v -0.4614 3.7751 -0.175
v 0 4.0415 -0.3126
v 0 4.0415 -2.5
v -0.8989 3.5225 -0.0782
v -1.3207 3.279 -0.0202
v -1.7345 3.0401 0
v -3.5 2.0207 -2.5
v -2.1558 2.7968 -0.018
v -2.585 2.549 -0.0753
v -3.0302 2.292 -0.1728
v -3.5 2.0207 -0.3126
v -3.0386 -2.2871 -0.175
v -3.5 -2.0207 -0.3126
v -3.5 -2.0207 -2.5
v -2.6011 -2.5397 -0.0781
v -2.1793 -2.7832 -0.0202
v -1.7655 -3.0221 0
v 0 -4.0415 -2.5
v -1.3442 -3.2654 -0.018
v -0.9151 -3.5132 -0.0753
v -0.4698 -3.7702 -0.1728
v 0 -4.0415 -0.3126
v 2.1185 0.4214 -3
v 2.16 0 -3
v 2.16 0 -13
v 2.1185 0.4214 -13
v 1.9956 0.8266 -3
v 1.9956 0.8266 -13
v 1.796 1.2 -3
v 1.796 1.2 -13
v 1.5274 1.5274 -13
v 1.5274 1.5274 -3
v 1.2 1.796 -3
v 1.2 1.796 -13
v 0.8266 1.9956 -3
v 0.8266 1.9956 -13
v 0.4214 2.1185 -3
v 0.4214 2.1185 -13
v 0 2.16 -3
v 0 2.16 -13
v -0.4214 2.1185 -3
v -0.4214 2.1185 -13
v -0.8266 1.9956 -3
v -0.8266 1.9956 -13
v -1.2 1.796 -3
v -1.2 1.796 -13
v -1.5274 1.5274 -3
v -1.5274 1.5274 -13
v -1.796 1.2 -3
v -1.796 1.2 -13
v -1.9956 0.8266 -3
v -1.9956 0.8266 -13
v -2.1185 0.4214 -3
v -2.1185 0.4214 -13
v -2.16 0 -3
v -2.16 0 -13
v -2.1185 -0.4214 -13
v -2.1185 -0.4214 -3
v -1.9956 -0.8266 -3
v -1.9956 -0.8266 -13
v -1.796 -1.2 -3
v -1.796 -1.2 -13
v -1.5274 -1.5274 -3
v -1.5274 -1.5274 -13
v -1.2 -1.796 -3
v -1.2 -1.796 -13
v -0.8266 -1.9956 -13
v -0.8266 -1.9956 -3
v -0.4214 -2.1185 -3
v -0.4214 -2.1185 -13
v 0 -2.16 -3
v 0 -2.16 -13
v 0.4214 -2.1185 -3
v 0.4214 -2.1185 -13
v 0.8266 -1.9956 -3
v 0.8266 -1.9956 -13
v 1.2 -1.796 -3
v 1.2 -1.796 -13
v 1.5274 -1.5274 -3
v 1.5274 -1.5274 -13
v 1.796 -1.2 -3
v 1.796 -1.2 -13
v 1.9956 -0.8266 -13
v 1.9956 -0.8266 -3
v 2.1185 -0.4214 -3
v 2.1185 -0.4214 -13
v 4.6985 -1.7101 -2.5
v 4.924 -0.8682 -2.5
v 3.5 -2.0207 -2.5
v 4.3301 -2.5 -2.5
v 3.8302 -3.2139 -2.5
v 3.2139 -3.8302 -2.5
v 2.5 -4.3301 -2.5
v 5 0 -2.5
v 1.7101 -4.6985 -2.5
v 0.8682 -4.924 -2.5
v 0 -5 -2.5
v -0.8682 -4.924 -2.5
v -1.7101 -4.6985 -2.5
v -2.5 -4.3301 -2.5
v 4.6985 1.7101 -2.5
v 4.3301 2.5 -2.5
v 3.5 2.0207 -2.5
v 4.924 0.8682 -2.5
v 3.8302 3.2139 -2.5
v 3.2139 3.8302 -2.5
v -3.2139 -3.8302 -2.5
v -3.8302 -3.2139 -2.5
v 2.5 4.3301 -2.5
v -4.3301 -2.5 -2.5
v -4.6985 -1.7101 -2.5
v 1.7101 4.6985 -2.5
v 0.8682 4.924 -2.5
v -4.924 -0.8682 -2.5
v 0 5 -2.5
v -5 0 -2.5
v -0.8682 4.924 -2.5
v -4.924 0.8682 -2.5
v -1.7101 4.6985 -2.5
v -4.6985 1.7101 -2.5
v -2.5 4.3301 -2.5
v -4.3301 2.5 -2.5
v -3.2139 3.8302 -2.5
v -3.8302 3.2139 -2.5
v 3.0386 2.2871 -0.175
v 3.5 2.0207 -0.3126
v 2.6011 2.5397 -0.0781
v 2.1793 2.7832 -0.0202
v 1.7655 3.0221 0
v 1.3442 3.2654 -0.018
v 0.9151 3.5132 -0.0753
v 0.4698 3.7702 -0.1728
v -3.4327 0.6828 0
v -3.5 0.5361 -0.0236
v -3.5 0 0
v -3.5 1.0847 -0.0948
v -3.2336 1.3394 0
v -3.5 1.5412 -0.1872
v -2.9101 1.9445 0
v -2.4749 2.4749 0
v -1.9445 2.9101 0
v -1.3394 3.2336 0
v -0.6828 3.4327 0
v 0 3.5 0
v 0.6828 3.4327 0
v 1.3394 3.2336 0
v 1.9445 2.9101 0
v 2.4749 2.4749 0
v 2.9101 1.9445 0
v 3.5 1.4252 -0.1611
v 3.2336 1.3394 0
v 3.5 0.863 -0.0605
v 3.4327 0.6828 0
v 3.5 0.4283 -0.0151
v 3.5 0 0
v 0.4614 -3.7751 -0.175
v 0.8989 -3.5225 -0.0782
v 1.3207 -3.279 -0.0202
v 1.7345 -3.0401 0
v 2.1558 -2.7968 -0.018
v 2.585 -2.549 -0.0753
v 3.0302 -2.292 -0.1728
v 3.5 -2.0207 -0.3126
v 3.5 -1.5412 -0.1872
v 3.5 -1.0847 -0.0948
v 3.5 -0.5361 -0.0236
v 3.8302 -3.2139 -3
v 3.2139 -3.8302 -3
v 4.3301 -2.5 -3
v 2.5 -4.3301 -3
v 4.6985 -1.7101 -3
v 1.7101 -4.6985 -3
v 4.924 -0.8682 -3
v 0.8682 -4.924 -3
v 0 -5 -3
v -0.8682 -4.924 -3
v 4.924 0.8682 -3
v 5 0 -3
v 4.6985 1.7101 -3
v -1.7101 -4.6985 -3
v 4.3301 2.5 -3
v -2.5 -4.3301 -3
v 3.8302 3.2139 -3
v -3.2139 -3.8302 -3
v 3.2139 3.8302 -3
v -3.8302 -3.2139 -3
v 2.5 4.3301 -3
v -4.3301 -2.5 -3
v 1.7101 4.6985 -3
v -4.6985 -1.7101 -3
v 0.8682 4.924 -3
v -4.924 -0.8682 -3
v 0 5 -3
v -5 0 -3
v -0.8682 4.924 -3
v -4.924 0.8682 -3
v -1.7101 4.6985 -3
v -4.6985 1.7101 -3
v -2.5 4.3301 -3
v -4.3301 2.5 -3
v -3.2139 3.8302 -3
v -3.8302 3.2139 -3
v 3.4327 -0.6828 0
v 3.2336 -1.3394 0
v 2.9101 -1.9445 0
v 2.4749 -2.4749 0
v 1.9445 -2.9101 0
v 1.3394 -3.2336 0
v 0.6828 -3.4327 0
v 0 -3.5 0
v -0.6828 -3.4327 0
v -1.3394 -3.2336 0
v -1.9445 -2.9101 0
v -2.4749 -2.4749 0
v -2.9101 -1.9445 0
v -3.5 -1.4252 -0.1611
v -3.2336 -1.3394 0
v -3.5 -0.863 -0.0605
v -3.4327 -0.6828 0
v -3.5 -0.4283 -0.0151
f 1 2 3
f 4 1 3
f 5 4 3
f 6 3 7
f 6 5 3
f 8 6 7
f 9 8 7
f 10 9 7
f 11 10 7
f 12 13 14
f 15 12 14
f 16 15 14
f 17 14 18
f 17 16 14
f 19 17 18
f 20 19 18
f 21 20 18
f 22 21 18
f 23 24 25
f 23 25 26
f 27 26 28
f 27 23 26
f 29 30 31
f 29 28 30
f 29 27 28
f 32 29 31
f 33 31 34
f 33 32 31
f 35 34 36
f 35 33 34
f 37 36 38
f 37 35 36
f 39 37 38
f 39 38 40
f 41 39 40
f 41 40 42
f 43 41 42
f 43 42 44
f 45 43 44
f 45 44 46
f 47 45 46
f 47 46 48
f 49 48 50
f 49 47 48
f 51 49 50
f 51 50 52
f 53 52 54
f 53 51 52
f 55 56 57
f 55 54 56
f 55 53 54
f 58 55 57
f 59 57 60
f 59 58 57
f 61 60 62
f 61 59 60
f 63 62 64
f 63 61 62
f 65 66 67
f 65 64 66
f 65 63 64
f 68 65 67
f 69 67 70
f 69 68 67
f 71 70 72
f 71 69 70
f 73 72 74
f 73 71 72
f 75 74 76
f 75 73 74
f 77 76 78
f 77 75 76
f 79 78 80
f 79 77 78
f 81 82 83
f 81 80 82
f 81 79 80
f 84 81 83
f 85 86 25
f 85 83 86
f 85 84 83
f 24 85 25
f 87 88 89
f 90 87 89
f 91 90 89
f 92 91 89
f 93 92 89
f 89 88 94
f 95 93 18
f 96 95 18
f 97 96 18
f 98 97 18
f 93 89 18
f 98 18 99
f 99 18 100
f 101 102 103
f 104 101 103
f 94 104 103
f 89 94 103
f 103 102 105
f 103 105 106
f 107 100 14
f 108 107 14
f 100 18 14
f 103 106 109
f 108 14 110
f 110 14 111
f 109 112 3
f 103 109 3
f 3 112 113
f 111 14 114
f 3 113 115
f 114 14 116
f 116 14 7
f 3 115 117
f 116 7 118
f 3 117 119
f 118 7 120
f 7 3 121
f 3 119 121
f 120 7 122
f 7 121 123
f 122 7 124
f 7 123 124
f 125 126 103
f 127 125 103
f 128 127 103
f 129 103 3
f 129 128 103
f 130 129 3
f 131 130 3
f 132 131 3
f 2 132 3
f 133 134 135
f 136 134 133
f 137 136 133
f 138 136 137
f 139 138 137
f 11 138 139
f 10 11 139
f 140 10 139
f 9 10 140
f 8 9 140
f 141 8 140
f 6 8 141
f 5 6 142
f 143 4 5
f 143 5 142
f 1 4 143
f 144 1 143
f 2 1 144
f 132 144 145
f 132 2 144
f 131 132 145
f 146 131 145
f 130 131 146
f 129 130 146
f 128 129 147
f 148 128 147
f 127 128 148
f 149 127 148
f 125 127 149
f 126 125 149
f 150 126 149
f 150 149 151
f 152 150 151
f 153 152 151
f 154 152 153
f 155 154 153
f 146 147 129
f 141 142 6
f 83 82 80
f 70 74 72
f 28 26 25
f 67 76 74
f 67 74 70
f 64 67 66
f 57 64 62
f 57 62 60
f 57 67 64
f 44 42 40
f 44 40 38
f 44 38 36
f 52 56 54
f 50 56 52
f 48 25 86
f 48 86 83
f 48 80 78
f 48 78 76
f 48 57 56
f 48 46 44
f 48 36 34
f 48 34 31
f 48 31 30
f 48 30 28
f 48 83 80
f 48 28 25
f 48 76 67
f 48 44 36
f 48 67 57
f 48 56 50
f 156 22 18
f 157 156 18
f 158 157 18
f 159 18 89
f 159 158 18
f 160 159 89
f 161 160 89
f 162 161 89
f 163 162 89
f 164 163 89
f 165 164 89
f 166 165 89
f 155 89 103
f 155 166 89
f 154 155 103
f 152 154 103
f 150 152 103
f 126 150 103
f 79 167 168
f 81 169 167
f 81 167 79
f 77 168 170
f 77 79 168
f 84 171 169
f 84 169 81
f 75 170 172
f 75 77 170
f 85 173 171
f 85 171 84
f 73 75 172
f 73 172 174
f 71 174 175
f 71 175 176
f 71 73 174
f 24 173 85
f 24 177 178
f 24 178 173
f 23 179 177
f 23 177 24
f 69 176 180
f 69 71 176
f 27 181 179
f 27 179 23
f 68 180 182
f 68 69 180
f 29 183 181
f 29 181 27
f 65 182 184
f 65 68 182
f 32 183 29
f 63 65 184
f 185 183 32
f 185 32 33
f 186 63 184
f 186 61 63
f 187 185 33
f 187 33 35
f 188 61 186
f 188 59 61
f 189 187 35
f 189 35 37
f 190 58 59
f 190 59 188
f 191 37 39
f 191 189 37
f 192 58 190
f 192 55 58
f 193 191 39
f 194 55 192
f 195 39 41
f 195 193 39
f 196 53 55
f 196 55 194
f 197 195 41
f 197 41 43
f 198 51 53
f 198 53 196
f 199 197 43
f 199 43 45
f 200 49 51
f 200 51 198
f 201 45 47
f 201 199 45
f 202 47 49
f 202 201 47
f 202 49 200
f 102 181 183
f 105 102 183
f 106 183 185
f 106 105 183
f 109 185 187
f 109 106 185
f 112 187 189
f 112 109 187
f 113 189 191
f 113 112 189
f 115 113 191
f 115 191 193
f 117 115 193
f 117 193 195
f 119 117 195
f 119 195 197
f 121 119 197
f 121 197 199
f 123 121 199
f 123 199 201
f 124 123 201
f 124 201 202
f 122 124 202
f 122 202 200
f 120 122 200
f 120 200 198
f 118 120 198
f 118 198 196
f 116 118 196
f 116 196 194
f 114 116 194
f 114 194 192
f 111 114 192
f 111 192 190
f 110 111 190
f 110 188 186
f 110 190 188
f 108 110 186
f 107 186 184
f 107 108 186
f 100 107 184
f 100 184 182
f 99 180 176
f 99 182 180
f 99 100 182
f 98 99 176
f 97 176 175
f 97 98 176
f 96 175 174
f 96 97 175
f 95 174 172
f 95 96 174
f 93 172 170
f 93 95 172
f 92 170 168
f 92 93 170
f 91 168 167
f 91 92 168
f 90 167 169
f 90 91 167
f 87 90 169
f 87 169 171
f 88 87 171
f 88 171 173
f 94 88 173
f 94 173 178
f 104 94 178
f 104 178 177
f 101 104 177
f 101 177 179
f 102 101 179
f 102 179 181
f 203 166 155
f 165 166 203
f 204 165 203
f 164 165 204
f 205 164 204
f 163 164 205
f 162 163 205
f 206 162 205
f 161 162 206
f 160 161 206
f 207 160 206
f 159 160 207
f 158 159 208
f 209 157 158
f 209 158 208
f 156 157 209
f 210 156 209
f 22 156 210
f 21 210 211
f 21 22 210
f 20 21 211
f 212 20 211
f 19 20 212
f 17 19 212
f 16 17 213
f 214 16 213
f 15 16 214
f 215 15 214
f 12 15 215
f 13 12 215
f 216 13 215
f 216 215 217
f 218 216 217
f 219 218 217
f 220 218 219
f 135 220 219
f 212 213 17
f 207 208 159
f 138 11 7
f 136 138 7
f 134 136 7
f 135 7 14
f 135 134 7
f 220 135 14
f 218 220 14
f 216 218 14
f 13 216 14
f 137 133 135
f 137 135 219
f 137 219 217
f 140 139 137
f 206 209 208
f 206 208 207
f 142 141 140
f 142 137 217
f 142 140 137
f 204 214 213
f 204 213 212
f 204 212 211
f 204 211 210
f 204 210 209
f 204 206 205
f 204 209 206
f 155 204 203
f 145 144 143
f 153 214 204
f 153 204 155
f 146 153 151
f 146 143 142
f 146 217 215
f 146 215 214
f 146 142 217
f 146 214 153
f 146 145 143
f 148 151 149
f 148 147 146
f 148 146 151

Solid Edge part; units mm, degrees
sketch "Sketch1" plane through (0, 0, 0) normal (0, 0, 1) x (1, 0, 0)
  line L0 (-3.5, -2.0207) -> (0, -4.0415)
  line L1 (0, -4.0415) -> (3.5, -2.0207)
  line L2 (3.5, -2.0207) -> (3.5, 2.0207)
  line L3 (3.5, 2.0207) -> (0, 4.0415)
  line L4 (0, 4.0415) -> (-3.5, 2.0207)
  line L5 (-3.5, 2.0207) -> (-3.5, -2.0207)
extrude "Protrusion1" add sketch "Sketch1" against normal blind 2.5
sketch "Sketch2" plane through (0, 0, 0) normal (0, -1, 0) x (1, 0, 0)
  line L0 (5.4053, -1.1) -> (5.2199, 0)
  line L1 (5.2199, 0) -> (3.5, 0)
  line L2 (3.5, 0) -> (5.4053, -1.1)
revolve "RevolvedCutout1" cut sketch "Sketch2" angle 360 about axis through (0, 0, 0) along (0, 0, 1)
sketch "Sketch3" plane through (0, 0, -2.5) normal (0, 0, -1) x (0.866, 0.5, 0)
  circle A0 centre (0, 0) radius 5
extrude "ExtrudedProtrusion_3" add sketch "Sketch3" along normal blind 0.5
sketch "Sketch4" plane through (0, 0, -3) normal (0, 0, -1) x (1, 0, 0)
  circle A0 centre (0, 0) radius 2.16
extrude "ExtrudedProtrusion_4" add sketch "Sketch4" along normal blind 10
